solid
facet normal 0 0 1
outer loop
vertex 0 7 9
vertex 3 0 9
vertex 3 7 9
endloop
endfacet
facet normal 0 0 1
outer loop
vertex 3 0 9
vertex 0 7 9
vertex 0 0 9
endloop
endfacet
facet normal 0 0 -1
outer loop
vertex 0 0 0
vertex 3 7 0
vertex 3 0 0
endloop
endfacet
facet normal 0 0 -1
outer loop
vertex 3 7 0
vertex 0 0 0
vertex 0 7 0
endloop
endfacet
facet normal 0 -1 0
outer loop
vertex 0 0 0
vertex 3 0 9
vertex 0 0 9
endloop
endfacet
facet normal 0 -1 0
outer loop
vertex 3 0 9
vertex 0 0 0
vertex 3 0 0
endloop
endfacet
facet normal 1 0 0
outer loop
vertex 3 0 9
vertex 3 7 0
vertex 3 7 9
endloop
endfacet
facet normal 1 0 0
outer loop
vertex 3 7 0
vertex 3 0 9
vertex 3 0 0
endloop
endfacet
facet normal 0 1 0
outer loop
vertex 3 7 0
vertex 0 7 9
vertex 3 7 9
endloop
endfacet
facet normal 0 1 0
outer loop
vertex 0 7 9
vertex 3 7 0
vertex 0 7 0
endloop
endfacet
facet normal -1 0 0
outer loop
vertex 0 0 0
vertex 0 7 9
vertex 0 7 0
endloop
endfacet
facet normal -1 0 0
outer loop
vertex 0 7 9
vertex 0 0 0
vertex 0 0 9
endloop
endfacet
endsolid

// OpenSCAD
// Generated by SolidPython 1.0.1 on 2020-07-29 00:02:42


cube(size = [3, 7, 9]);
/***********************************************
*********      SolidPython code:      **********
************************************************
 
# import packages: SolidPython
from solid import *
from solid.utils import *
from itertools import chain, combinations


class Resize:

    def __init__(self, scad_file):
        self.scad_file = scad_file
        #self.scad_file = import_scad(scad_file)
        # cone/cylinder param:
        self.r1 = 0
        self.r2 = 0
        self.h = 0
        # rectangular prism param:
        self.w = 0
        self.l = 0
        # ellipse param:
        self.r = 0

    # import OpenScad code (file name corresponds to shape)


    # classify shape + parameters
    def assign(self, param1, param2, param3):
        if self.scad_file == 'cone.scad':
            self.r1 = param1
            self.r2 = param2
            self.h = param3
        elif self.scad_file == 'cylinder.scad':
            self.r1 = param1
            self.r2 = param2
            self.h = param3
        elif self.scad_file == 'rectangularPrism.scad':
            self.h = param1
            self.l = param2
            self.w = param3
        else:
            self.r = param1
            self.h = param2

    # resize parameters
    def iterate(self):
        x = range(3, 20, 2)
        i = 1
        if self.scad_file == 'cone.scad':
            tempList = list(combinations(x, 3))
            #print(tempList)
            for i in x:
                for j in range (3):
                    param1 = tempList[i][0]
                    param2 = tempList[i][1]
                    param3 = tempList[i][2]
                    filepath = 'produced_scad_files/' + 'cone' + str(param1) + '_' + str(param2) + '_' + str(param3) + '.scad'
                    scad_render_to_file(cylinder(h=param1, r1=param2, r2=param3), filepath)

        elif self.scad_file == 'cylinder.scad':
            tempList = list(combinations(x, 3))
            for i in x:
                for j in range(3):
                    param1 = tempList[i][0]
                    param2 = tempList[i][1]
                    param3 = tempList[i][2]
                    filepath = 'produced_scad_files/' + 'cylinder' + str(param1) + '_' + str(param2) + '_' + str(param3) + '.scad'
                    scad_render_to_file(cylinder(h=param1, r1=param2, r2=param3), filepath)

        elif self.scad_file == 'rectangularPrism.scad':
            tempList = list(combinations(x, 3))
            for i in x:
                for j in range(3):
                    param1 = tempList[i][0]
                    param2 = tempList[i][1]
                    param3 = tempList[i][2]
                    filepath = 'produced_scad_files/' + 'rectangularPrism' + str(param1) + '_' + str(param2) + '_' + str(
                        param3) + '.scad'
                    scad_render_to_file(cube(size=(param1, param2, param3)), filepath)

        else:
            tempList = list(combinations(x, 2))
            for i in x:
                for j in range(3):
                    param1 = tempList[i][0]
                    param2 = tempList[i][1]
                    filepath = 'produced_scad_files/' + 'ellipse' + str(param1) + '_' + str(param2) + '_' + '.scad'
                    scad_render_to_file(sphere(param1, param2), filepath)

    def render_to_scadfile(self):
        scad_render_to_file(scad, 'example.scad') 
 
************************************************/
